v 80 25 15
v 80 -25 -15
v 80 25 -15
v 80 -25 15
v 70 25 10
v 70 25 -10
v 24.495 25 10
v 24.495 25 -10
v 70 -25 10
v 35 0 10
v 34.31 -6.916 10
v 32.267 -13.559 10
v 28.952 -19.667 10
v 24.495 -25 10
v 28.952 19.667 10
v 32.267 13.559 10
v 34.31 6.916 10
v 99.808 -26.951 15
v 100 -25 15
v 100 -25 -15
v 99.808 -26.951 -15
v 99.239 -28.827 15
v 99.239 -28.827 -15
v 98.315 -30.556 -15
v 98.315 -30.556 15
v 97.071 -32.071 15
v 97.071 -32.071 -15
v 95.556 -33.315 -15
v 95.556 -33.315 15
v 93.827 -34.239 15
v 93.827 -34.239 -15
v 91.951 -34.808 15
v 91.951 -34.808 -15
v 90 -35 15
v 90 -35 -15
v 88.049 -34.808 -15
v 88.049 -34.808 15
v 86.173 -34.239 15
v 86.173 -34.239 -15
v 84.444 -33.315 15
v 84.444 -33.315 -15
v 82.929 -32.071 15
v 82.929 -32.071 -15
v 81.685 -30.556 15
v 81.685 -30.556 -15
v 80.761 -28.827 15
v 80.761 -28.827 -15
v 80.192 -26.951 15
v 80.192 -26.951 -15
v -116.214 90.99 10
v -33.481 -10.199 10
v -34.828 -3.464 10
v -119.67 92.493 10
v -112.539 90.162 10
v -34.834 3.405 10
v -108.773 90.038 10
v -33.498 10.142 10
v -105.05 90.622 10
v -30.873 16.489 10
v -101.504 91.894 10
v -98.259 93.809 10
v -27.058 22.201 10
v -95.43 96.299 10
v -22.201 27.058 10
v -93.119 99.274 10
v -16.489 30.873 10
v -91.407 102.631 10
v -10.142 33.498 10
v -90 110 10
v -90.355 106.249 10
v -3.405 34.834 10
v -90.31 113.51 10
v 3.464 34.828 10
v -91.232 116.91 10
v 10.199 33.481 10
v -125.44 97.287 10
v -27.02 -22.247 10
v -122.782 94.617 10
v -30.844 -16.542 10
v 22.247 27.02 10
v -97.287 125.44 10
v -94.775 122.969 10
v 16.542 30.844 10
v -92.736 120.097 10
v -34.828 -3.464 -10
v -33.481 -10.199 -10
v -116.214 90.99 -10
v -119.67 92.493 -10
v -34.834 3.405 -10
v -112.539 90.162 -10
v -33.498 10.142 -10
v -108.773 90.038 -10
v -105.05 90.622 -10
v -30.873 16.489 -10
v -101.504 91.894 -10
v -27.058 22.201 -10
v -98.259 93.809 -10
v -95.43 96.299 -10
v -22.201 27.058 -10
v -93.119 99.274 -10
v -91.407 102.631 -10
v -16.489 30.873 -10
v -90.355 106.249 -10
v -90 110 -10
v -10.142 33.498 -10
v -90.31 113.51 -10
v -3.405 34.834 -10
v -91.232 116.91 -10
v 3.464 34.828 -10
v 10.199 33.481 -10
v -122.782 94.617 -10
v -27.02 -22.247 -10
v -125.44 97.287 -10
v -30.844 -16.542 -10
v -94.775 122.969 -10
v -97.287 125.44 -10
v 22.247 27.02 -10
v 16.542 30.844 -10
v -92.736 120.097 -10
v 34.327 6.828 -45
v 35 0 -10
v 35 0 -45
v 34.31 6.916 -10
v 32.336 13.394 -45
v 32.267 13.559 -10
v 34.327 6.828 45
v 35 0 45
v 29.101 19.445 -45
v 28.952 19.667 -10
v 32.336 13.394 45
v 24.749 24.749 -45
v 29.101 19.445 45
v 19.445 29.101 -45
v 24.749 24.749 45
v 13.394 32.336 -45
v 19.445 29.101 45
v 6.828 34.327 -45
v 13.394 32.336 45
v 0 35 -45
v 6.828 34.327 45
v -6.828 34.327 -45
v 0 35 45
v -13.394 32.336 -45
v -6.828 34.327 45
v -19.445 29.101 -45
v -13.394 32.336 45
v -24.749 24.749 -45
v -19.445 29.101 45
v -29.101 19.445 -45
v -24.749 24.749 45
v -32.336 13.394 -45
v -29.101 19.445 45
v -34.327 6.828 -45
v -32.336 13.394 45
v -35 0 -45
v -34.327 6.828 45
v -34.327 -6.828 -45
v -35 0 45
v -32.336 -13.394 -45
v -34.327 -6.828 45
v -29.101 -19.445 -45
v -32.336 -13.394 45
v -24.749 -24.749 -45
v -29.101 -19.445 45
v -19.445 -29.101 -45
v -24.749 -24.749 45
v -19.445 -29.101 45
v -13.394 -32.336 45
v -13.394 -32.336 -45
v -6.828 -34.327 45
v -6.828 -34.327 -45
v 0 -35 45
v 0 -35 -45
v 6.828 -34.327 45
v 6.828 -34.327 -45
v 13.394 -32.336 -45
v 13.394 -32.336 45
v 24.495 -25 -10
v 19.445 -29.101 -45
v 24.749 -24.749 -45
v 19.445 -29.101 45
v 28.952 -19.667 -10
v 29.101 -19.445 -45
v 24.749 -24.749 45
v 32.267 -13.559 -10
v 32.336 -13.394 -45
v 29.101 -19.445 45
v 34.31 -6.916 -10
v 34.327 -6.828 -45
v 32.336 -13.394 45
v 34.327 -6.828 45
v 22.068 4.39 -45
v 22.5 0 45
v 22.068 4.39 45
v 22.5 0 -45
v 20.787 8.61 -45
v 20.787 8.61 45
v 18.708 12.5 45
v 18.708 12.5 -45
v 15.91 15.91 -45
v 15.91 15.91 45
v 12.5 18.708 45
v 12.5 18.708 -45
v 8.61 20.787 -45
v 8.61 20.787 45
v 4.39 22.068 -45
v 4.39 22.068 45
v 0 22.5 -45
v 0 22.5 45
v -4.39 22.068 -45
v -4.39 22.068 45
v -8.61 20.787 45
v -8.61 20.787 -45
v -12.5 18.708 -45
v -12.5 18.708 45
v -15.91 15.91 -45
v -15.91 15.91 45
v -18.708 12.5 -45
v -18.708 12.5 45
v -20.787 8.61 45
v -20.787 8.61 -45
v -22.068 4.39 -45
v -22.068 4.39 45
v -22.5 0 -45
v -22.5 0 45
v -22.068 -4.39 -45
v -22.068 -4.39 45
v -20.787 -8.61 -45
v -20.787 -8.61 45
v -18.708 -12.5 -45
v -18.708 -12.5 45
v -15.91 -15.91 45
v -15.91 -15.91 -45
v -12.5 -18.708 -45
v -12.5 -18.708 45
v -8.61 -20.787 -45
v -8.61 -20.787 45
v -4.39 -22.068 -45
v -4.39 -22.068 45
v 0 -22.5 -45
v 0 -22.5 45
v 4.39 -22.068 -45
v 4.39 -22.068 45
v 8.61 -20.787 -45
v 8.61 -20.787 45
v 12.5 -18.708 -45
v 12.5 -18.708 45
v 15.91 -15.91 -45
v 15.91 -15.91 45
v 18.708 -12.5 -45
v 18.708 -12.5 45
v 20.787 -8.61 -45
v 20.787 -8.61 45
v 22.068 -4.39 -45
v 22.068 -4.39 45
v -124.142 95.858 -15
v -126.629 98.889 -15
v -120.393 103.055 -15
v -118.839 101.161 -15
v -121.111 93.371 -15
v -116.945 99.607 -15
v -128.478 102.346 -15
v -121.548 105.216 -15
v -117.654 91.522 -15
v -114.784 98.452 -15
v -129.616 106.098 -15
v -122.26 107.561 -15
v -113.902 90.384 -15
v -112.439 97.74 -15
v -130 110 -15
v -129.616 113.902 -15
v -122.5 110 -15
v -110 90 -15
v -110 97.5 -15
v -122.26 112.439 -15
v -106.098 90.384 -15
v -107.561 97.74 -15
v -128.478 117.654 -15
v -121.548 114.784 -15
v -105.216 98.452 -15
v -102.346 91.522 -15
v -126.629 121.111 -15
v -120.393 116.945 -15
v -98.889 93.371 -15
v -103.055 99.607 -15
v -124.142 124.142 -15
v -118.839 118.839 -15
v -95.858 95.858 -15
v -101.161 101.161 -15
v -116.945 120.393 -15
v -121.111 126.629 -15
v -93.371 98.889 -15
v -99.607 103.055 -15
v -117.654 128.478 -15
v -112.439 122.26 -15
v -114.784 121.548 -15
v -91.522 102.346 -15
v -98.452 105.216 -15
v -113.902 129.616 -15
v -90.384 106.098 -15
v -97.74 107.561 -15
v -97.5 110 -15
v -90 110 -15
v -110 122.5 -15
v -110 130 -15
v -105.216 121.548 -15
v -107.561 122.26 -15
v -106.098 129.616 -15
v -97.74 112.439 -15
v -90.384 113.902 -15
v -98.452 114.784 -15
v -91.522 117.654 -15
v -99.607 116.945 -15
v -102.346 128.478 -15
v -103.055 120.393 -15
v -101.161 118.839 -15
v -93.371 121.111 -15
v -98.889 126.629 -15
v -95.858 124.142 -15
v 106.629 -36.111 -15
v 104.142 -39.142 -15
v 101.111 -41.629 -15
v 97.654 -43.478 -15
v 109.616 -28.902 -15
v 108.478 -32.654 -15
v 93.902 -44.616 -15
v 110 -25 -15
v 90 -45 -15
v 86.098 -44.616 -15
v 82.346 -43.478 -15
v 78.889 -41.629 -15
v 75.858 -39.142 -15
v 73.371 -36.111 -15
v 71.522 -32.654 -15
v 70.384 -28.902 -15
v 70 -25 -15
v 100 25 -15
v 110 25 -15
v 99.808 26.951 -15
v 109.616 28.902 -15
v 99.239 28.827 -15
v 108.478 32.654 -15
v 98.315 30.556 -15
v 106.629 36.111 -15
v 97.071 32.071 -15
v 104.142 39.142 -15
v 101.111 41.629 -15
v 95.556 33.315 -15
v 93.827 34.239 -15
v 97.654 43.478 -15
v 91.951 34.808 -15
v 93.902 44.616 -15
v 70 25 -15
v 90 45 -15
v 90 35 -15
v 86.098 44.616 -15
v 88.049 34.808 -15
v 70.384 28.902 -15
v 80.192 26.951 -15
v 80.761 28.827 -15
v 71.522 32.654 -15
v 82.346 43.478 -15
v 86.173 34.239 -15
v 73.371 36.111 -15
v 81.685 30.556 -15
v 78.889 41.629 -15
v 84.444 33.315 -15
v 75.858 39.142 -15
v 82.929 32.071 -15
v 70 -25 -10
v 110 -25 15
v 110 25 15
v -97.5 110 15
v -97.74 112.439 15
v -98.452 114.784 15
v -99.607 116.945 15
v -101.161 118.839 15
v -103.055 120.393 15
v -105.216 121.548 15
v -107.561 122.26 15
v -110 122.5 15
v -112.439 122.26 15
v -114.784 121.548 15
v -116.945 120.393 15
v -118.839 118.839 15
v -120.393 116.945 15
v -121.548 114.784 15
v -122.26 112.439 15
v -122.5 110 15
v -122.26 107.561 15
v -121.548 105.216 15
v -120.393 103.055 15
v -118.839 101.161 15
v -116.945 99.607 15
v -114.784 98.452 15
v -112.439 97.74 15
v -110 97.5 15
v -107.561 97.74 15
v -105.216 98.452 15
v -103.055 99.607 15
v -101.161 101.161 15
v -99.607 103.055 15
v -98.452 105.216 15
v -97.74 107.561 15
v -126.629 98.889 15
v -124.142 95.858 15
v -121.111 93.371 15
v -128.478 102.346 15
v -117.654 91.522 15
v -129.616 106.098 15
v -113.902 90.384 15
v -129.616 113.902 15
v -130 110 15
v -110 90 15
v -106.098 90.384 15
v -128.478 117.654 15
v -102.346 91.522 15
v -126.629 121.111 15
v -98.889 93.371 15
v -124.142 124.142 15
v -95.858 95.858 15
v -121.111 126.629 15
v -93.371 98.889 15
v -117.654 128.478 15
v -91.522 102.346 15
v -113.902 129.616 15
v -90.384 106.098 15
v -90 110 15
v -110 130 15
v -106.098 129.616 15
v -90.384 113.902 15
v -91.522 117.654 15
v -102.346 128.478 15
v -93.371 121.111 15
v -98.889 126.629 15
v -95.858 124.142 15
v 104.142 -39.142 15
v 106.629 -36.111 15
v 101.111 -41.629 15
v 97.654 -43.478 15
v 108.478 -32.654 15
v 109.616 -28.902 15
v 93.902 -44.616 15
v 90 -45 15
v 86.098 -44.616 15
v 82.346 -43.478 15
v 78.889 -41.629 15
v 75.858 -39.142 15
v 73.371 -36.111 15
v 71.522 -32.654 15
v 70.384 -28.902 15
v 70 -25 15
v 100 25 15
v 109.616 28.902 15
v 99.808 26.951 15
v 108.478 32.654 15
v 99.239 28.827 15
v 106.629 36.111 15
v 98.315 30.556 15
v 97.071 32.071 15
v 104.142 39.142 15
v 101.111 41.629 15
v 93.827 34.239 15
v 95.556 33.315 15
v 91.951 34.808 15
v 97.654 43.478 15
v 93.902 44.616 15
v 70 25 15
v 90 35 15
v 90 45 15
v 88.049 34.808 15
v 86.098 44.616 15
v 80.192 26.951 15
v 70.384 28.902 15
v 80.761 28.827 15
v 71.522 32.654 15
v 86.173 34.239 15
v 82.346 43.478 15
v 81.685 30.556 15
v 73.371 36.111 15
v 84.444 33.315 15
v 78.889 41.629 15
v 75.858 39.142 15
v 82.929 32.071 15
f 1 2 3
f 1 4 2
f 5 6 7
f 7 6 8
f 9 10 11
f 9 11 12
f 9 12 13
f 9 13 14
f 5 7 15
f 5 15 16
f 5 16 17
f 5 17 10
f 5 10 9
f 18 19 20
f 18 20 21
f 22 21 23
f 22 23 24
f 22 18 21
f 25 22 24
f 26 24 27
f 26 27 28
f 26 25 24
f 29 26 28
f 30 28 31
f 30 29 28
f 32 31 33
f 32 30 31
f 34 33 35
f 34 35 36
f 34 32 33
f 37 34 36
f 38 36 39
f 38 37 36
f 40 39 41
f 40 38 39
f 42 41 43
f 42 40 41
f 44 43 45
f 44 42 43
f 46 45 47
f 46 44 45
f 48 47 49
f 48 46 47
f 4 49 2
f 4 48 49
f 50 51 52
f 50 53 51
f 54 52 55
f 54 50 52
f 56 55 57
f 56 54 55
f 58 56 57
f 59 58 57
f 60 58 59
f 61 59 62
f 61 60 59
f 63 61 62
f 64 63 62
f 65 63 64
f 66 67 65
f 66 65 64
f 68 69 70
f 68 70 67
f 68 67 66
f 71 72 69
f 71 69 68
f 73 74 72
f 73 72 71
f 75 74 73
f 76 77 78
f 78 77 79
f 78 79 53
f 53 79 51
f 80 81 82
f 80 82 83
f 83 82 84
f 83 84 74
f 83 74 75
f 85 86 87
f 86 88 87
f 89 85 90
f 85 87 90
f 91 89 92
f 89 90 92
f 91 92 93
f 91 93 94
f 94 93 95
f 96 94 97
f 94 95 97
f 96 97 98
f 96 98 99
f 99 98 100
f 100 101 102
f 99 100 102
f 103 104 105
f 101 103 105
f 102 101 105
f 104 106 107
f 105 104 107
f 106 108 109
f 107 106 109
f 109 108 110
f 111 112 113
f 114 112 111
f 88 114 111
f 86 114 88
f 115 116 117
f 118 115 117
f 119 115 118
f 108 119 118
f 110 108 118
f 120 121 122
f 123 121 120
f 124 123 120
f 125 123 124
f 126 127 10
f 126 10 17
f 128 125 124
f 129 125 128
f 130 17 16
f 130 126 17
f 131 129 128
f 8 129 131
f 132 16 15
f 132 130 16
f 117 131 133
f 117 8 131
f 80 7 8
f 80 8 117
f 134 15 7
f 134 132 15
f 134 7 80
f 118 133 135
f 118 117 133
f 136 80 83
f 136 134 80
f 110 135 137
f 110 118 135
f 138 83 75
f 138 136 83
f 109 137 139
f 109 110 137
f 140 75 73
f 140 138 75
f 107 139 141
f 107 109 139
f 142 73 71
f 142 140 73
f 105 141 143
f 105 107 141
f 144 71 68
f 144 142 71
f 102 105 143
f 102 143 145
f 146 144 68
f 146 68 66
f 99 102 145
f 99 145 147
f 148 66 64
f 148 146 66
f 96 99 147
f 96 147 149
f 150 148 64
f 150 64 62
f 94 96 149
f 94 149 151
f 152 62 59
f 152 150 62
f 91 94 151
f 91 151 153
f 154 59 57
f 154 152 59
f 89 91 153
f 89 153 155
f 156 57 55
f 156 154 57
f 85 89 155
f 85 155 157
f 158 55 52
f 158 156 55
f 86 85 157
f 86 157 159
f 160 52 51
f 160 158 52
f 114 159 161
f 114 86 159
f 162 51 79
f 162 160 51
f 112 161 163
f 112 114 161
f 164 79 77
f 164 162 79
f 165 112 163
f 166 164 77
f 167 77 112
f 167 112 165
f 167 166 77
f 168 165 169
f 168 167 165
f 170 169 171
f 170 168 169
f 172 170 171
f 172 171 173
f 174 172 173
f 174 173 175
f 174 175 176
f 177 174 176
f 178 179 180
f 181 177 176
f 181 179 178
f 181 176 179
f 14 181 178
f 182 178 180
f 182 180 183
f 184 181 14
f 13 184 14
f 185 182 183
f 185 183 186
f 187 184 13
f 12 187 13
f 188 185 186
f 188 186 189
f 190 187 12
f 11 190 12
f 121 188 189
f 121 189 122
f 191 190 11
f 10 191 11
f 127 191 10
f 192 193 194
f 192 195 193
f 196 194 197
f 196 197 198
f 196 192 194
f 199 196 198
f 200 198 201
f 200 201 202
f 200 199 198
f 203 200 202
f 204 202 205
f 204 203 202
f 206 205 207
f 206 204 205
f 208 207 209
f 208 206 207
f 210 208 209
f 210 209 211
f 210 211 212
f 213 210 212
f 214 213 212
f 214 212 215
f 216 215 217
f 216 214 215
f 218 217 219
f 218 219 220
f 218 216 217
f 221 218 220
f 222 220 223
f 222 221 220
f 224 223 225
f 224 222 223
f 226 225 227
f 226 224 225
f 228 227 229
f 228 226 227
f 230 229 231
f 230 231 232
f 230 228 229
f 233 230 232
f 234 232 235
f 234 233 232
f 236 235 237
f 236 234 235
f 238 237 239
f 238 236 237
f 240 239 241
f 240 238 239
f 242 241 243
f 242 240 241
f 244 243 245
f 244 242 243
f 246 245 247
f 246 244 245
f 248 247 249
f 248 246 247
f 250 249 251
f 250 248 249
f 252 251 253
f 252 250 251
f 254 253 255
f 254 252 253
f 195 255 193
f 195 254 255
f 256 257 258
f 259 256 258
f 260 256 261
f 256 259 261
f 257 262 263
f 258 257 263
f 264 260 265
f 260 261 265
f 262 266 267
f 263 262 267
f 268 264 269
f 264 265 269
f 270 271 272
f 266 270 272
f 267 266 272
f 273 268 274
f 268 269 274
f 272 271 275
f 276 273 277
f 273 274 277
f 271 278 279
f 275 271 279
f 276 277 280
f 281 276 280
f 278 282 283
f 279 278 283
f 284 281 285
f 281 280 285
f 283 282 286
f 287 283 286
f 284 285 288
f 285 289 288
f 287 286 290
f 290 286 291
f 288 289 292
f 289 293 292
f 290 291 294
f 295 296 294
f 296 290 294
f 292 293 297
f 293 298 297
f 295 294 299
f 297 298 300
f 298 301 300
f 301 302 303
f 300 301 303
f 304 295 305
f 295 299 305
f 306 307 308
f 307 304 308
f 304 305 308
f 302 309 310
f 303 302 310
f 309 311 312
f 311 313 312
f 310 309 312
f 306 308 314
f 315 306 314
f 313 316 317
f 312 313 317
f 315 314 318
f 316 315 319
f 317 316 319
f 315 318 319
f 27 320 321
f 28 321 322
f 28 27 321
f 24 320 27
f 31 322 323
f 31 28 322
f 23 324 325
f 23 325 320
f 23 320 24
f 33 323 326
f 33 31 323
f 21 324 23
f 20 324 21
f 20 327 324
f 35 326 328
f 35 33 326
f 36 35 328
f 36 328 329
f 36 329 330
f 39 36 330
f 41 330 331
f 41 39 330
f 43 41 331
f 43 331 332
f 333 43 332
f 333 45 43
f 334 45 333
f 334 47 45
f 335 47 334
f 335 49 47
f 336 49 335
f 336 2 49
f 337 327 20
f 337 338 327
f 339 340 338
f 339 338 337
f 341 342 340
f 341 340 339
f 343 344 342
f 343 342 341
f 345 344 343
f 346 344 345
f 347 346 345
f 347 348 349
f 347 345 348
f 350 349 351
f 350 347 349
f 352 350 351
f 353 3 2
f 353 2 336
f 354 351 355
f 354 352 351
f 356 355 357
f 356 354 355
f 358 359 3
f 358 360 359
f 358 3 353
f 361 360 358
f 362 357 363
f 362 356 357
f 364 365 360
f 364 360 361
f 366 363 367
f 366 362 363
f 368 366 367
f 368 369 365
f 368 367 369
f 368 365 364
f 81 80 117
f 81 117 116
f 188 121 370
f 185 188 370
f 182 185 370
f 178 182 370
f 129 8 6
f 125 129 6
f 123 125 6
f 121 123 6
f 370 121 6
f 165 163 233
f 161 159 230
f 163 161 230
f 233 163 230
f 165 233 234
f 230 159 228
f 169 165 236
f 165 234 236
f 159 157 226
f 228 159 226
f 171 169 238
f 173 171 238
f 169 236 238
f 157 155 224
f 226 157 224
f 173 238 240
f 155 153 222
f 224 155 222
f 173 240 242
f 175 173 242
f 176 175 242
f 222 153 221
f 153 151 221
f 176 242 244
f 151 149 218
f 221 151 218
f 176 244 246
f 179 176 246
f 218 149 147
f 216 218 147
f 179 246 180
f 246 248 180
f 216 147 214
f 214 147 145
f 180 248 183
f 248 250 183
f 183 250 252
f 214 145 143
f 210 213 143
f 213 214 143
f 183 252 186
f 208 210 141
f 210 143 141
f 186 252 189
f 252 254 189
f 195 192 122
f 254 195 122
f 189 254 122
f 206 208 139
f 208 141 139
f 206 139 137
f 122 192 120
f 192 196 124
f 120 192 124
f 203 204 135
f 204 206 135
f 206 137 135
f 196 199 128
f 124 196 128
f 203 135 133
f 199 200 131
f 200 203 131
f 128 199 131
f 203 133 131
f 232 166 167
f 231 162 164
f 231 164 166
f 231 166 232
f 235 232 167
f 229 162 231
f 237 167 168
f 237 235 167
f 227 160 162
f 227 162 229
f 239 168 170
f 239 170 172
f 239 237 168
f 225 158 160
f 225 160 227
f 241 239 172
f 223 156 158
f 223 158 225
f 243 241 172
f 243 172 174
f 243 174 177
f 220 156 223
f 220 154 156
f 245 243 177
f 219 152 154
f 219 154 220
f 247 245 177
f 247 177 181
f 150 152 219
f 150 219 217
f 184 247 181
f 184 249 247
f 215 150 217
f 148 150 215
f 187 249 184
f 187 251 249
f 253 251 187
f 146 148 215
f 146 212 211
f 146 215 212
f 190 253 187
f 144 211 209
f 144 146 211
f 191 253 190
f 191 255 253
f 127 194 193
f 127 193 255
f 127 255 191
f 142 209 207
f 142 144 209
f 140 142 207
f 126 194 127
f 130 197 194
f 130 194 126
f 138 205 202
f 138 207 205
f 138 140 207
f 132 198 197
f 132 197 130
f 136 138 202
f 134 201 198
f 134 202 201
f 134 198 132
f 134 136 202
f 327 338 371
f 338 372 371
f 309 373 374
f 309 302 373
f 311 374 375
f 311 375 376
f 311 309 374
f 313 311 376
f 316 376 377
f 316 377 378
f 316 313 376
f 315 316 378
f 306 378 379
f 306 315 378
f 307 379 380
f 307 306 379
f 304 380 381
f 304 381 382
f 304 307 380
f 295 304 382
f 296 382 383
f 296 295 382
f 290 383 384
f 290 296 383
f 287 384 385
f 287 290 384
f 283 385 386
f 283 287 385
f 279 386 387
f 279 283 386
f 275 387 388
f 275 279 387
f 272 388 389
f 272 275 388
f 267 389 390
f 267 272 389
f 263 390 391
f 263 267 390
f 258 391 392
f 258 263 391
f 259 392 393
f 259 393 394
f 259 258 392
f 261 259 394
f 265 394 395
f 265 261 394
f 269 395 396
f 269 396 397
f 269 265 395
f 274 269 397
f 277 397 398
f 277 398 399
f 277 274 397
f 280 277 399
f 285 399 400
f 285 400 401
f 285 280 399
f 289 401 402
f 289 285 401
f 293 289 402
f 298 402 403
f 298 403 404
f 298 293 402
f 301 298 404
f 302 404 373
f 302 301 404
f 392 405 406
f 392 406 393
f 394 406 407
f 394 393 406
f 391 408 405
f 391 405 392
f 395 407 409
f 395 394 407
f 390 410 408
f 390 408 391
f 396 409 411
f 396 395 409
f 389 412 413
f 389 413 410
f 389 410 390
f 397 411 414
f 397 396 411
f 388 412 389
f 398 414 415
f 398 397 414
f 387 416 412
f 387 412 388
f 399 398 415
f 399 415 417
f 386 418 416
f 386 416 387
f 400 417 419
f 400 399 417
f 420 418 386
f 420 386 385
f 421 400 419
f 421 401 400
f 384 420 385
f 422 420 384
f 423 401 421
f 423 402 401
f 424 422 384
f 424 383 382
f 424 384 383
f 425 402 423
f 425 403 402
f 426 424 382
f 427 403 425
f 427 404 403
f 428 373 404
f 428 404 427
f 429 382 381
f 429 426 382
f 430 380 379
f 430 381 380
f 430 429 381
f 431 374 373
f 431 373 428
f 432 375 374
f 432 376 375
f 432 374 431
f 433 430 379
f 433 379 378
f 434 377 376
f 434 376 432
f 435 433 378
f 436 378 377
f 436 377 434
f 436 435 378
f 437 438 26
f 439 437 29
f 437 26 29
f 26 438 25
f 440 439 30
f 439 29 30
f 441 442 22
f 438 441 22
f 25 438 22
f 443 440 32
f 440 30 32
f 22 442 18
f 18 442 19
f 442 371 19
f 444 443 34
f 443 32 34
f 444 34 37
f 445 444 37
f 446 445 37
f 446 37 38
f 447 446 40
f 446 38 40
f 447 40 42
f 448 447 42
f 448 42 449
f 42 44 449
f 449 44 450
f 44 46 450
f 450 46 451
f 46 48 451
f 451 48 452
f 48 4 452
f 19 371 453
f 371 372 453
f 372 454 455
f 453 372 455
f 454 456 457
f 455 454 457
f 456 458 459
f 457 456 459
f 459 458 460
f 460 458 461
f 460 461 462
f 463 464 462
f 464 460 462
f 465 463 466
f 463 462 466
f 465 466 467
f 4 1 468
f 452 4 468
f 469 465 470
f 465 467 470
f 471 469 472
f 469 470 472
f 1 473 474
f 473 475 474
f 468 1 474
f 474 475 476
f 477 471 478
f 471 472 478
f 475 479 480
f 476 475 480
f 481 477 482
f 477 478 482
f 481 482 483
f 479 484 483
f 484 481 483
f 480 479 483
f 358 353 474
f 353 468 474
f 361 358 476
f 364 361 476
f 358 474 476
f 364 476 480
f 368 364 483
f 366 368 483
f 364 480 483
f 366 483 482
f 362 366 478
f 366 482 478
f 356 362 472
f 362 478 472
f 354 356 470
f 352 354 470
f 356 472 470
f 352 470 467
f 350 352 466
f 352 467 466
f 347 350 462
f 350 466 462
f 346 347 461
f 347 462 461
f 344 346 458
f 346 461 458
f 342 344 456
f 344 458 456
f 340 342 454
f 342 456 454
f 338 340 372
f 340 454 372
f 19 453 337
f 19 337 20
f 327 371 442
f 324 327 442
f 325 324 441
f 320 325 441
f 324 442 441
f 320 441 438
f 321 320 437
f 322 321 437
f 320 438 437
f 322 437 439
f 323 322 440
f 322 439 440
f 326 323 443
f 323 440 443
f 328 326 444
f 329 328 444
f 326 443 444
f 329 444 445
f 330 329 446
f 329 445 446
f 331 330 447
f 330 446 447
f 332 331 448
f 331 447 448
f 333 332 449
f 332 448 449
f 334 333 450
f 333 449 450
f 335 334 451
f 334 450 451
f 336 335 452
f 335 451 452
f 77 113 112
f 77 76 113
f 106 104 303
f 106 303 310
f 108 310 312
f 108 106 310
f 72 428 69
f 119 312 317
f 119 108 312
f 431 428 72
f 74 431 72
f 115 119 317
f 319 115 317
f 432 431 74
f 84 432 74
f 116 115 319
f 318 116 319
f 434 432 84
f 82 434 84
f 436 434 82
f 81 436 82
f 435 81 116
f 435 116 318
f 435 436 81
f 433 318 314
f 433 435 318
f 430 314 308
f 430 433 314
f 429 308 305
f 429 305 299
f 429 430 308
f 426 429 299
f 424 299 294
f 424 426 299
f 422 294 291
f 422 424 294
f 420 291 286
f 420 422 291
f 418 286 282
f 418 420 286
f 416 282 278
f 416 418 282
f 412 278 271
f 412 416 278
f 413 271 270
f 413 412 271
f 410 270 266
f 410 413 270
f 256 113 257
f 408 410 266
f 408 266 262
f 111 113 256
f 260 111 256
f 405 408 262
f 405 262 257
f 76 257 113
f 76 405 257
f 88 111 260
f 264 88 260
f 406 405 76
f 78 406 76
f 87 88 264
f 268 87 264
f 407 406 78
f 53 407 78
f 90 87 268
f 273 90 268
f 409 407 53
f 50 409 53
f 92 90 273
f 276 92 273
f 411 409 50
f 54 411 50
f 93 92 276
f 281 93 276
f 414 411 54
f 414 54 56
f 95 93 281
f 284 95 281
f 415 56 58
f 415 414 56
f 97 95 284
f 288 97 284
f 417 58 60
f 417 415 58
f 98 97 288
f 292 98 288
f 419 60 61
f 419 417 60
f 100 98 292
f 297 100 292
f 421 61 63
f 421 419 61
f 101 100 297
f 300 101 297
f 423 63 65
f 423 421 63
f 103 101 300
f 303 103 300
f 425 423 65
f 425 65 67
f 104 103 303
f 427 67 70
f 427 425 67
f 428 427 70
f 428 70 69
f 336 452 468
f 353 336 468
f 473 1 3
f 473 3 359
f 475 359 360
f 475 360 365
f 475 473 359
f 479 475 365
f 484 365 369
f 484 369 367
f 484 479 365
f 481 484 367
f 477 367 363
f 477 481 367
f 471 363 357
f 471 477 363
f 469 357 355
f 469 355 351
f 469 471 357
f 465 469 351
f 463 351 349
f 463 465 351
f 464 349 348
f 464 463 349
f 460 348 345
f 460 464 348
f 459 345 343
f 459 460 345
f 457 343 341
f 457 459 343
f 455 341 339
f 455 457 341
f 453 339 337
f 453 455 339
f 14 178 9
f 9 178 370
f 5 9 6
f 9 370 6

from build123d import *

# Parameters (mm, degrees)
ESBO_O2_R                  = 22.499999999999996
RESSALTO_EXTRUS_O1_DEPTH   = 45
RESSALTO_EXTRUS_O2_DEPTH   = 15
ESBO_O2_3_R                = 19.999999999999982
ESBO_O2_3_R_2              = 12.50000000000002
RESSALTO_EXTRUS_O2_2_DEPTH = 15
RESSALTO_EXTRUS_O4_DEPTH   = 10


with BuildPart() as part:
    # Esboço2 → Ressalto-extrusão1 (new, symmetric)
    with BuildSketch(Plane.XY):
        with BuildLine():
            ThreePointArc((-27.019781356912492, -22.24705408418482), (-1.8677359336065302, -34.95012964900582), (24.49489742783113, -25.000000000000647))
            ThreePointArc((24.49489742783113, -25.000000000000647), (32.26702194171388, -13.558735007844774), (35.00000000000001, -8.57e-15))
            ThreePointArc((35.00000000000001, 0), (32.267021941714255, 13.558735007843877), (24.494897427832516, 24.999999999999286))
            ThreePointArc((24.494897427832516, 24.999999999999286), (23.392784934043004, 26.034162422279138), (22.2470540841853, 27.019781356912098))
            ThreePointArc((22.2470540841853, 27.019781356912098), (-24.748737341528944, 24.74873734152939), (-27.019781356912492, -22.24705408418482))
        make_face()
        Circle(ESBO_O2_R, mode=Mode.SUBTRACT)
    extrude(amount=RESSALTO_EXTRUS_O1_DEPTH, both=True)



with BuildPart() as body_2:
    # Esboço2<3> → Ressalto-extrusão2 (new, symmetric)
    with BuildSketch(Plane.XY):
        with BuildLine():
            Line((69.99999999999999, 24.99999999999937), (70, -25.0000000000006))
            ThreePointArc((70, -25.0000000000006), (90, -45.00000000000057), (110, -25.00000000000059))
            Line((109.99999999999999, -25.00000000000059), (109.99999999999999, 24.999999999999396))
            ThreePointArc((109.99999999999997, 24.999999999999392), (89.99999999999997, 44.999999999999424), (69.99999999999997, 24.99999999999938))
        make_face()
        with BuildLine():
            ThreePointArc((100, -25.000000000000597), (90, -35.00000000000057), (80, -25.000000000000597))
            Line((80, -25.000000000000597), (79.99999999999999, 24.999999999999375))
            ThreePointArc((79.99999999999997, 24.99999999999938), (89.99999999999996, 34.99999999999941), (99.99999999999997, 24.999999999999407))
            Line((99.99999999999997, 24.999999999999407), (99.99999999999999, -25.000000000000593))
        make_face(mode=Mode.SUBTRACT)
    extrude(amount=RESSALTO_EXTRUS_O2_DEPTH, both=True)


with BuildPart() as body_3:
    # Esboço2<3> → Ressalto-extrus_o2 2 (new, symmetric)
    with BuildSketch(Plane.XY):
        with Locations((-110, 110.00000000000196)):
            Circle(ESBO_O2_3_R)
        with Locations((-110.00000000000001, 110.00000000000196)):
            Circle(ESBO_O2_3_R_2, mode=Mode.SUBTRACT)
    extrude(amount=RESSALTO_EXTRUS_O2_2_DEPTH, both=True)


with BuildPart() as part_1:
    add(part.part)

    add(body_3.part)  # Ressalto-extrusão4 merges body 3
    # Esboço2<5> → Ressalto-extrusão4 (add, symmetric)
    with BuildSketch(Plane.XY):
        with BuildLine():
            Line((24.49489742783112, -25.000000000000647), (70, -25.0000000000006))
            Line((70, -25.0000000000006), (69.99999999999999, 24.99999999999937))
            Line((69.99999999999999, 24.999999999999375), (24.494897427832516, 24.999999999999286))
            ThreePointArc((24.494897427832516, 24.999999999999286), (35.000000000000014, -9.77e-13), (24.49489742783112, -25.000000000000654))
        make_face()
        with BuildLine():
            Line((-125.43987506109286, 97.28739766618204), (-27.019781356912475, -22.24705408418481))
            ThreePointArc((-27.019781356912492, -22.24705408418482), (-24.748737341528944, 24.74873734152939), (22.2470540841853, 27.019781356912098))
            Line((22.247054084185294, 27.019781356912105), (-97.28739766617986, 125.43987506109455))
            ThreePointArc((-97.28739766617984, 125.43987506109457), (-95.85786437626919, 95.8578643762709), (-125.43987506109285, 97.28739766618206))
        make_face()
    extrude(amount=RESSALTO_EXTRUS_O4_DEPTH, both=True)


solid = Compound([body_2.part, part_1.part])
